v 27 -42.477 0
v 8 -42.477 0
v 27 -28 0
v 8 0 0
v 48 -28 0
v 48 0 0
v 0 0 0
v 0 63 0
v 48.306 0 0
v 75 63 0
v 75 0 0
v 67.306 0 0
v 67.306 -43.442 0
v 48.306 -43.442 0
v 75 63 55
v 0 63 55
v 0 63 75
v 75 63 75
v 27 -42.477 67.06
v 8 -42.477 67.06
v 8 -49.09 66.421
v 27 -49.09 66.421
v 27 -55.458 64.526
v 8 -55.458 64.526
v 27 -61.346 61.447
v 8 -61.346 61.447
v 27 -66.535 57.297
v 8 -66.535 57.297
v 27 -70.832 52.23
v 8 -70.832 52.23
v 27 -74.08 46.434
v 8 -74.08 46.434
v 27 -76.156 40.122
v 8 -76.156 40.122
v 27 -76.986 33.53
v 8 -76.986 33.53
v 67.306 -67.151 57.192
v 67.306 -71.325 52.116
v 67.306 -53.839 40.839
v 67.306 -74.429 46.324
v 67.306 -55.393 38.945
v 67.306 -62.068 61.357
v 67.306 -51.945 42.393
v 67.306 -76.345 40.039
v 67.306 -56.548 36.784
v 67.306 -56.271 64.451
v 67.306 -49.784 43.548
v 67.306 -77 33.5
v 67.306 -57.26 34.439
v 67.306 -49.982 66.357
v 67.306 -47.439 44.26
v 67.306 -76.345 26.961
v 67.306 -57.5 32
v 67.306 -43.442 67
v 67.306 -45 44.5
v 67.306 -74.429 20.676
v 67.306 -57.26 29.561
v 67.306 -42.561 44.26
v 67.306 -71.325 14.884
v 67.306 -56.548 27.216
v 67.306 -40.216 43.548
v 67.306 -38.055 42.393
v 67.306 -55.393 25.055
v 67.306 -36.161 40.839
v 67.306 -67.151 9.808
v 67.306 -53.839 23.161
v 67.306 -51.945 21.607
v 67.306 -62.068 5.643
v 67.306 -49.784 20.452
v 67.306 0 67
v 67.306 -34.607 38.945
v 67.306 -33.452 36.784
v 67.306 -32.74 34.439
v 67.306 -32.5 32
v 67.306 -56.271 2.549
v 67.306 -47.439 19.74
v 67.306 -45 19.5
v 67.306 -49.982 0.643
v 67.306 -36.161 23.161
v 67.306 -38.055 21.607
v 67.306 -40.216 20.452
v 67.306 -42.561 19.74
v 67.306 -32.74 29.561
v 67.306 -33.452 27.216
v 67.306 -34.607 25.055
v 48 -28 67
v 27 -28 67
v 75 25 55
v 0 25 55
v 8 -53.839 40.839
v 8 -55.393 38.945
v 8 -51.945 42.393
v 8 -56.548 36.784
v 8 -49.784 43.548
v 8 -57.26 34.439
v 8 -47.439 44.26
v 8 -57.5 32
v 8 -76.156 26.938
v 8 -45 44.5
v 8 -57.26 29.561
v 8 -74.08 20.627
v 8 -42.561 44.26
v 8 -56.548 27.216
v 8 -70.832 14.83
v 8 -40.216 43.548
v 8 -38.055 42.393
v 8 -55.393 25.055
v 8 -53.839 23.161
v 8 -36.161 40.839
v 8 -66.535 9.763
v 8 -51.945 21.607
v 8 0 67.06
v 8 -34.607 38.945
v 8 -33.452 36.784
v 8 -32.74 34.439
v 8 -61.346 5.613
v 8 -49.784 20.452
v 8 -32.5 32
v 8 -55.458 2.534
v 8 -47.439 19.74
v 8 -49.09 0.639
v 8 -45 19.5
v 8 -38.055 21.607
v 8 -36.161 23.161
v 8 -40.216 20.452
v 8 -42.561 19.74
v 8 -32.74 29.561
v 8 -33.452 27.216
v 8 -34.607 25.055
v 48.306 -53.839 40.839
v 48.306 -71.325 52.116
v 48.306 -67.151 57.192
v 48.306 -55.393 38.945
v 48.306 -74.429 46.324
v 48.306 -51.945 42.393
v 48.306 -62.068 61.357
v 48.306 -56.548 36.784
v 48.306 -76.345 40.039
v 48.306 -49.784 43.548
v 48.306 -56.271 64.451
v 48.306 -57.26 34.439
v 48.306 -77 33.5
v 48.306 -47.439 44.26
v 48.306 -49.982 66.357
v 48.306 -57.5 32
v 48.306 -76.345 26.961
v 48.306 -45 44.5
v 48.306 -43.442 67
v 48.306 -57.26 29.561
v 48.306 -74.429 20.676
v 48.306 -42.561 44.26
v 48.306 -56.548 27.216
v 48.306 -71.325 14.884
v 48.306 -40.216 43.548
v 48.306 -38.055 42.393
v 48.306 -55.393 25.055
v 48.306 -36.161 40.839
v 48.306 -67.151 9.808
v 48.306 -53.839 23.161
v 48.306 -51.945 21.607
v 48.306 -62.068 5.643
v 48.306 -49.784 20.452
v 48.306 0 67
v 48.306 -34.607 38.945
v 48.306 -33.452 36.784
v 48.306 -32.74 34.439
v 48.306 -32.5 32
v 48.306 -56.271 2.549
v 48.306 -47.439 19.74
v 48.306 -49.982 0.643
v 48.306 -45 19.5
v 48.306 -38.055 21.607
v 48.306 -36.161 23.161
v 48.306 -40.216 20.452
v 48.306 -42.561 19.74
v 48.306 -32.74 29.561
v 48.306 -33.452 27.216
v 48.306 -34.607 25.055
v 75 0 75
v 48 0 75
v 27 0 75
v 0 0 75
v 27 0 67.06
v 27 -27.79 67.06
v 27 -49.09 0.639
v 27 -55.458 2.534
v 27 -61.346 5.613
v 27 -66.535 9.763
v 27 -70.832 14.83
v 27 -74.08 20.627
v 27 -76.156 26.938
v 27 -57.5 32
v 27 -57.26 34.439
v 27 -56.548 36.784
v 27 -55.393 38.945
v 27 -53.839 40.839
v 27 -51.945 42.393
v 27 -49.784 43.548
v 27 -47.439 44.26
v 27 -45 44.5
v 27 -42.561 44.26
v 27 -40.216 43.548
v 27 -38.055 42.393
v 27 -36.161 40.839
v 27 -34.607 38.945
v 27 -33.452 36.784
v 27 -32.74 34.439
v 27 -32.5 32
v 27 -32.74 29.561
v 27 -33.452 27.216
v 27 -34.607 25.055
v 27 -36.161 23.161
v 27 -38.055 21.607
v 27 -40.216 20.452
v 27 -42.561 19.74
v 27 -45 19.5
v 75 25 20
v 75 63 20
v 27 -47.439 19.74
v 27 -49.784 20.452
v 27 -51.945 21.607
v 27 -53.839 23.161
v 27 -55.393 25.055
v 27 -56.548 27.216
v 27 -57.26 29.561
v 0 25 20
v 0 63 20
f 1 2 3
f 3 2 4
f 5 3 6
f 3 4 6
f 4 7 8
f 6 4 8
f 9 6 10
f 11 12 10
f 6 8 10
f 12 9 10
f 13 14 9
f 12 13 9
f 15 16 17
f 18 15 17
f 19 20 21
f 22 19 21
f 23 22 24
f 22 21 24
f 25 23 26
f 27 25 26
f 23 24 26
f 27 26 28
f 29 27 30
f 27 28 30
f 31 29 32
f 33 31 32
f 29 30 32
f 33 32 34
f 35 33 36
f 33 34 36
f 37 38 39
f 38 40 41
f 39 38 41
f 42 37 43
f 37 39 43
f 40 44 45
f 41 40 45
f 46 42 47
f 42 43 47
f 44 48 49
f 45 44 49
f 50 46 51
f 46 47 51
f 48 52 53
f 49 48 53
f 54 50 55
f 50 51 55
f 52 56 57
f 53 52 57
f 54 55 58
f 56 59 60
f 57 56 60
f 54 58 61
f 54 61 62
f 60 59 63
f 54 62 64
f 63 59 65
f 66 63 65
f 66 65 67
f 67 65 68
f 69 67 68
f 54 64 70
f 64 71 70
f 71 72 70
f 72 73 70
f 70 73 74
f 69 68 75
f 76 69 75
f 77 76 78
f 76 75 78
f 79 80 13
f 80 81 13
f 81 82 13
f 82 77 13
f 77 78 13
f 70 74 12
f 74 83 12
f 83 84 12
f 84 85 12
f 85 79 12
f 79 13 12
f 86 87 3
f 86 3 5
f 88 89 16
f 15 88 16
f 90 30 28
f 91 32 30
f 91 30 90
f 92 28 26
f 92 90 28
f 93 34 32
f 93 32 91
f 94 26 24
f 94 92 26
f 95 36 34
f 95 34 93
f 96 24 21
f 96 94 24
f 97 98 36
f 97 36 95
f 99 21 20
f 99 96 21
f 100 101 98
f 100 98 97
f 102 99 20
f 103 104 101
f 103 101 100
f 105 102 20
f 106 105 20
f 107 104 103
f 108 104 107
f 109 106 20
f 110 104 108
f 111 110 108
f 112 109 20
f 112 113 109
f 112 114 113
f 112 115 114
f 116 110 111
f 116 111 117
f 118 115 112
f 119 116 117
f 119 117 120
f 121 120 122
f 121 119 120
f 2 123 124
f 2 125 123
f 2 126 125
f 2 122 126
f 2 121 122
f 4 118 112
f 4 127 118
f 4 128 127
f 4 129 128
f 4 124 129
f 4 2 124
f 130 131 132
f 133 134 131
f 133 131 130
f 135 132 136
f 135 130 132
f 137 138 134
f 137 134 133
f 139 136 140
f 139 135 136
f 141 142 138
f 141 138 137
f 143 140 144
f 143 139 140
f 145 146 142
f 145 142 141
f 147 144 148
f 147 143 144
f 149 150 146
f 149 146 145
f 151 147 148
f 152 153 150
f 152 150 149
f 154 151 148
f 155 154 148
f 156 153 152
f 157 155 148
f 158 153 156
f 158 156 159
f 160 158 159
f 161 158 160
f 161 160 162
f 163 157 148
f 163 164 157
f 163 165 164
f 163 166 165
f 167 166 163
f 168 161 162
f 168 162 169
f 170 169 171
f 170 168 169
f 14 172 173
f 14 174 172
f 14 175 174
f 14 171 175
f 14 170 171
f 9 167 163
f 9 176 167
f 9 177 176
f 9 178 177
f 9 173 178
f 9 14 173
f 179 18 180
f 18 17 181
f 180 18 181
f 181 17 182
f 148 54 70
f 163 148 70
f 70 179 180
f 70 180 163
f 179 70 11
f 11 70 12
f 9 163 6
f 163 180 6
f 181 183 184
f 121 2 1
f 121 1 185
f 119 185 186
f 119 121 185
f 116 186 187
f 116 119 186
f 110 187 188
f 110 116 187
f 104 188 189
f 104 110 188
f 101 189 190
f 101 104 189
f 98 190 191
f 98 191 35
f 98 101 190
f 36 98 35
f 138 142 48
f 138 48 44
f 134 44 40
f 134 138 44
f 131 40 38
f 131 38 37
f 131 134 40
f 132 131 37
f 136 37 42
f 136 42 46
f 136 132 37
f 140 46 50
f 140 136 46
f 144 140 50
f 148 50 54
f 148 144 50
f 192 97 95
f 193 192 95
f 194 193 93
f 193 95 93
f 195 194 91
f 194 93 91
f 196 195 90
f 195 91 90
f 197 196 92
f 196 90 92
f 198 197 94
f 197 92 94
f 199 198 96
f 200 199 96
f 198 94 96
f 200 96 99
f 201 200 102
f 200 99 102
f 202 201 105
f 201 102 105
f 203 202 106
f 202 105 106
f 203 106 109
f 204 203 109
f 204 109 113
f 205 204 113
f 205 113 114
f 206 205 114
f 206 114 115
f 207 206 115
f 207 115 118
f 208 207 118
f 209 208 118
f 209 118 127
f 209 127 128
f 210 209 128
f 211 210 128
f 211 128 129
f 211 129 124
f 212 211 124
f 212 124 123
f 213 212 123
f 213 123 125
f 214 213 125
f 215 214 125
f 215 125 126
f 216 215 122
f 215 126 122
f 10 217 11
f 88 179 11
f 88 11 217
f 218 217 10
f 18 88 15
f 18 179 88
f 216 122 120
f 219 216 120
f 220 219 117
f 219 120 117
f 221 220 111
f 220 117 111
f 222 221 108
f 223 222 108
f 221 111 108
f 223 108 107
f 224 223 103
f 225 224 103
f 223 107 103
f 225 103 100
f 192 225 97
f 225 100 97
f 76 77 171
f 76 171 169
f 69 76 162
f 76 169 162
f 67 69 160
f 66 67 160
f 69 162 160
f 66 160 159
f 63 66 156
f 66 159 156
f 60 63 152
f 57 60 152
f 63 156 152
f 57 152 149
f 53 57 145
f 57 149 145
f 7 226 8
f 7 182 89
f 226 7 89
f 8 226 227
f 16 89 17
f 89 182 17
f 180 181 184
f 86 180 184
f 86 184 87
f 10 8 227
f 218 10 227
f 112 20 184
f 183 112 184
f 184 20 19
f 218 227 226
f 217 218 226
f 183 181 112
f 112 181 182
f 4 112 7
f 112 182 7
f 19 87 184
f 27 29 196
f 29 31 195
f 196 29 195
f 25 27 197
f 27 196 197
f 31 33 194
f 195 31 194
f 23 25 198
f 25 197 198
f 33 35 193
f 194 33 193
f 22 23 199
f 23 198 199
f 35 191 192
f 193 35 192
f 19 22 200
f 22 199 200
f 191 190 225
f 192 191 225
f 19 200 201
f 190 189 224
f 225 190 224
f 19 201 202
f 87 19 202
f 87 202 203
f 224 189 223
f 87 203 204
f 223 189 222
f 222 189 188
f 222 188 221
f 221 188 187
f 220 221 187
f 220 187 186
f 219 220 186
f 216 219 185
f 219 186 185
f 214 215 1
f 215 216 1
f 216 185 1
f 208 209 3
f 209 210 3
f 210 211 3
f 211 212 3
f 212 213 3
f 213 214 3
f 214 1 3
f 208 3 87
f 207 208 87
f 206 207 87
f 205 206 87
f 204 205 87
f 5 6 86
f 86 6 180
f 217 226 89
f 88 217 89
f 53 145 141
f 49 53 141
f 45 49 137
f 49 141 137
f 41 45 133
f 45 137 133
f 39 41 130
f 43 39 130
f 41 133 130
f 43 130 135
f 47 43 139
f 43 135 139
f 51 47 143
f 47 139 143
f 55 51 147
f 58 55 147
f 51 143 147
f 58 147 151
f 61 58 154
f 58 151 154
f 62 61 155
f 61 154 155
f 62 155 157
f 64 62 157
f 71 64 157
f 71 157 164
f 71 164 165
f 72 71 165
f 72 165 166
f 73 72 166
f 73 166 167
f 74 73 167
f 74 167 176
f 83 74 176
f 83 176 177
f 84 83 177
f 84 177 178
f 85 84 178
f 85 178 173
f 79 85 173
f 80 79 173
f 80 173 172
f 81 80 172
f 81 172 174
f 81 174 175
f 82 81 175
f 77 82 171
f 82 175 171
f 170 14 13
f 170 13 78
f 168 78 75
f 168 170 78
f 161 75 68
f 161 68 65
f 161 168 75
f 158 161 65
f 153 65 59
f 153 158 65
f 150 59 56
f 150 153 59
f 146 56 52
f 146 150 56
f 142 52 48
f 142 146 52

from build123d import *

# Parameters (mm, degrees)
F1_DEPTH     = 75
F2_W         = 21
F2_H         = 75
F3_DEPTH     = 28
F5_DEPTH     = 50.8
F6_W         = 19
F6_H         = 77
F7_DEPTH     = 75
F9_DEPTH     = 38.6
F11_DEPTH    = 19
F12_W        = 19
F12_H        = 77
F13_DEPTH    = 77
F14_W        = 19
F14_H        = 9.9398646951
F15_DEPTH    = 77
F17_DEPTH    = 75.4
F18_T1_DEPTH = 19
F19_T1_DEPTH = 102.8939212925
F19_T3_DEPTH = 186.7878425849


# Not quite as in the source:
# - a fillet or chamfer that OpenCascade refuses, or shapes differently, is made with other operations: its cross-section is extruded or revolved along the edge and cut away or added


with BuildPart() as f1:
    # F0 (on Right) → F1 (new body)
    with BuildSketch(Plane.YZ):
        Polygon((0, 75), (0, 0), (63, 0), (63, 20), (25, 20), (25, 55), (63, 55), (63, 75), align=None)
    extrude(amount=F1_DEPTH)

    # F2 (on face) → F3 (join)
    with BuildSketch(Plane.XZ):
        with Locations((37.5, 37.5)):
            Rectangle(F2_W, F2_H)
    extrude(amount=F3_DEPTH)

    # F4 (on face) → F5 (cut)
    with BuildSketch(Plane(origin=(27, 0, 0), x_dir=(0, -1, 0), z_dir=(-1, 0, 0))):
        Polygon((28, 67), (28, 75), (0, 75), align=None)
    extrude(amount=-F5_DEPTH, mode=Mode.SUBTRACT)

    # F6 (on Top) → F7 (join)
    with BuildSketch(Plane.XY):
        with Locations((57.8057536185, -38.5)):
            Rectangle(F6_W, F6_H)
    extrude(amount=F7_DEPTH)

    # F8 (on face) → F9 (cut)
    with BuildSketch(Plane(origin=(48.3057536185, 0, 0), x_dir=(0, -1, 0), z_dir=(-1, 0, 0))):
        Polygon((77, 75), (0, 75), (27.784453705, 67), (77, 67), align=None)
    extrude(amount=-F9_DEPTH, mode=Mode.SUBTRACT)

    # F10 (on face) → F11 (cut)
    with BuildSketch(Plane.YZ.offset(67.3057536185)):
        Polygon((0, 75), (-27.784453705, 67), (0, 67), align=None)
    extrude(amount=-F11_DEPTH, mode=Mode.SUBTRACT)

    # F12 (on Top) → F13 (join)
    with BuildSketch(Plane.XY):
        with Locations((17.5, -38.5)):
            Rectangle(F12_W, F12_H)
    extrude(amount=F13_DEPTH)

    # F14 (on face) → F15 (cut)
    with BuildSketch(Plane.XZ.offset(77)):
        with Locations((17.5, 72.0300676525)):
            Rectangle(F14_W, F14_H)
    extrude(amount=-F15_DEPTH, mode=Mode.SUBTRACT)

    # F16 (on face) → F17 (cut)
    with BuildSketch(Plane(origin=(8, 0, 0), x_dir=(0, -1, 0), z_dir=(-1, 0, 0))):
        with BuildLine():
            ThreePointArc((57.5, 32), (36.1611652352, 40.8388347648), (45, 19.5))
            ThreePointArc((45, 19.5), (53.8388347648, 23.1611652352), (57.5, 32))
        make_face()
    extrude(amount=-F17_DEPTH, mode=Mode.SUBTRACT)

    # F18: fillet of radius 34.5232539419 on 2 edges, made by hand

    # F18_s2 → F18_t1 (cut)
    with BuildSketch(Plane.YZ.offset(8)):
        with BuildLine():
            ThreePointArc((-42.4767460581, 67.0601353049), (-66.888373029, 56.948508334), (-77, 32.536881363))
            Line((-77, 32.536881363), (-77.6904650788, 32.536881363))
            Line((-77.6904650788, 32.536881363), (-77.6904650788, 67.7506003838))
            Line((-77.6904650788, 67.7506003838), (-42.4767460581, 67.7506003838))
            Line((-42.4767460581, 67.7506003838), (-42.4767460581, 67.0601353049))
        make_face()
        with BuildLine():
            ThreePointArc((-42.4767460581, 0), (-66.888373029, 10.111626971), (-77, 34.5232539419))
            Line((-77, 34.5232539419), (-77.6904650788, 34.5232539419))
            Line((-77.6904650788, 34.5232539419), (-77.6904650788, -0.6904650788))
            Line((-77.6904650788, -0.6904650788), (-42.4767460581, -0.6904650788))
            Line((-42.4767460581, -0.6904650788), (-42.4767460581, 0))
        make_face()
    extrude(amount=F18_T1_DEPTH, mode=Mode.SUBTRACT)

    # F19: fillet of radius 33.557568517 on 2 edges, made by hand

    # F19_s2 → F19_t1 (cut)
    with BuildSketch(Plane.YZ.offset(48.3057536185)):
        with BuildLine():
            ThreePointArc((-77, 33.442431483), (-67.1712157415, 57.1712157415), (-43.442431483, 67))
            Line((-43.442431483, 67), (-77, 67))
            Line((-77, 67), (-77, 33.442431483))
        make_face()
    extrude(amount=F19_T1_DEPTH, mode=Mode.SUBTRACT)

    # F19_s4 → F19_t3 (cut)
    with BuildSketch(Plane.YZ.offset(-35.588167674)):
        with BuildLine():
            ThreePointArc((-43.442431483, 0), (-67.1712157415, 9.8287842585), (-77, 33.557568517))
            Line((-77, 33.557568517), (-77, 0))
            Line((-77, 0), (-43.442431483, 0))
        make_face()
    extrude(amount=F19_T3_DEPTH, mode=Mode.SUBTRACT)


solid = f1.part
